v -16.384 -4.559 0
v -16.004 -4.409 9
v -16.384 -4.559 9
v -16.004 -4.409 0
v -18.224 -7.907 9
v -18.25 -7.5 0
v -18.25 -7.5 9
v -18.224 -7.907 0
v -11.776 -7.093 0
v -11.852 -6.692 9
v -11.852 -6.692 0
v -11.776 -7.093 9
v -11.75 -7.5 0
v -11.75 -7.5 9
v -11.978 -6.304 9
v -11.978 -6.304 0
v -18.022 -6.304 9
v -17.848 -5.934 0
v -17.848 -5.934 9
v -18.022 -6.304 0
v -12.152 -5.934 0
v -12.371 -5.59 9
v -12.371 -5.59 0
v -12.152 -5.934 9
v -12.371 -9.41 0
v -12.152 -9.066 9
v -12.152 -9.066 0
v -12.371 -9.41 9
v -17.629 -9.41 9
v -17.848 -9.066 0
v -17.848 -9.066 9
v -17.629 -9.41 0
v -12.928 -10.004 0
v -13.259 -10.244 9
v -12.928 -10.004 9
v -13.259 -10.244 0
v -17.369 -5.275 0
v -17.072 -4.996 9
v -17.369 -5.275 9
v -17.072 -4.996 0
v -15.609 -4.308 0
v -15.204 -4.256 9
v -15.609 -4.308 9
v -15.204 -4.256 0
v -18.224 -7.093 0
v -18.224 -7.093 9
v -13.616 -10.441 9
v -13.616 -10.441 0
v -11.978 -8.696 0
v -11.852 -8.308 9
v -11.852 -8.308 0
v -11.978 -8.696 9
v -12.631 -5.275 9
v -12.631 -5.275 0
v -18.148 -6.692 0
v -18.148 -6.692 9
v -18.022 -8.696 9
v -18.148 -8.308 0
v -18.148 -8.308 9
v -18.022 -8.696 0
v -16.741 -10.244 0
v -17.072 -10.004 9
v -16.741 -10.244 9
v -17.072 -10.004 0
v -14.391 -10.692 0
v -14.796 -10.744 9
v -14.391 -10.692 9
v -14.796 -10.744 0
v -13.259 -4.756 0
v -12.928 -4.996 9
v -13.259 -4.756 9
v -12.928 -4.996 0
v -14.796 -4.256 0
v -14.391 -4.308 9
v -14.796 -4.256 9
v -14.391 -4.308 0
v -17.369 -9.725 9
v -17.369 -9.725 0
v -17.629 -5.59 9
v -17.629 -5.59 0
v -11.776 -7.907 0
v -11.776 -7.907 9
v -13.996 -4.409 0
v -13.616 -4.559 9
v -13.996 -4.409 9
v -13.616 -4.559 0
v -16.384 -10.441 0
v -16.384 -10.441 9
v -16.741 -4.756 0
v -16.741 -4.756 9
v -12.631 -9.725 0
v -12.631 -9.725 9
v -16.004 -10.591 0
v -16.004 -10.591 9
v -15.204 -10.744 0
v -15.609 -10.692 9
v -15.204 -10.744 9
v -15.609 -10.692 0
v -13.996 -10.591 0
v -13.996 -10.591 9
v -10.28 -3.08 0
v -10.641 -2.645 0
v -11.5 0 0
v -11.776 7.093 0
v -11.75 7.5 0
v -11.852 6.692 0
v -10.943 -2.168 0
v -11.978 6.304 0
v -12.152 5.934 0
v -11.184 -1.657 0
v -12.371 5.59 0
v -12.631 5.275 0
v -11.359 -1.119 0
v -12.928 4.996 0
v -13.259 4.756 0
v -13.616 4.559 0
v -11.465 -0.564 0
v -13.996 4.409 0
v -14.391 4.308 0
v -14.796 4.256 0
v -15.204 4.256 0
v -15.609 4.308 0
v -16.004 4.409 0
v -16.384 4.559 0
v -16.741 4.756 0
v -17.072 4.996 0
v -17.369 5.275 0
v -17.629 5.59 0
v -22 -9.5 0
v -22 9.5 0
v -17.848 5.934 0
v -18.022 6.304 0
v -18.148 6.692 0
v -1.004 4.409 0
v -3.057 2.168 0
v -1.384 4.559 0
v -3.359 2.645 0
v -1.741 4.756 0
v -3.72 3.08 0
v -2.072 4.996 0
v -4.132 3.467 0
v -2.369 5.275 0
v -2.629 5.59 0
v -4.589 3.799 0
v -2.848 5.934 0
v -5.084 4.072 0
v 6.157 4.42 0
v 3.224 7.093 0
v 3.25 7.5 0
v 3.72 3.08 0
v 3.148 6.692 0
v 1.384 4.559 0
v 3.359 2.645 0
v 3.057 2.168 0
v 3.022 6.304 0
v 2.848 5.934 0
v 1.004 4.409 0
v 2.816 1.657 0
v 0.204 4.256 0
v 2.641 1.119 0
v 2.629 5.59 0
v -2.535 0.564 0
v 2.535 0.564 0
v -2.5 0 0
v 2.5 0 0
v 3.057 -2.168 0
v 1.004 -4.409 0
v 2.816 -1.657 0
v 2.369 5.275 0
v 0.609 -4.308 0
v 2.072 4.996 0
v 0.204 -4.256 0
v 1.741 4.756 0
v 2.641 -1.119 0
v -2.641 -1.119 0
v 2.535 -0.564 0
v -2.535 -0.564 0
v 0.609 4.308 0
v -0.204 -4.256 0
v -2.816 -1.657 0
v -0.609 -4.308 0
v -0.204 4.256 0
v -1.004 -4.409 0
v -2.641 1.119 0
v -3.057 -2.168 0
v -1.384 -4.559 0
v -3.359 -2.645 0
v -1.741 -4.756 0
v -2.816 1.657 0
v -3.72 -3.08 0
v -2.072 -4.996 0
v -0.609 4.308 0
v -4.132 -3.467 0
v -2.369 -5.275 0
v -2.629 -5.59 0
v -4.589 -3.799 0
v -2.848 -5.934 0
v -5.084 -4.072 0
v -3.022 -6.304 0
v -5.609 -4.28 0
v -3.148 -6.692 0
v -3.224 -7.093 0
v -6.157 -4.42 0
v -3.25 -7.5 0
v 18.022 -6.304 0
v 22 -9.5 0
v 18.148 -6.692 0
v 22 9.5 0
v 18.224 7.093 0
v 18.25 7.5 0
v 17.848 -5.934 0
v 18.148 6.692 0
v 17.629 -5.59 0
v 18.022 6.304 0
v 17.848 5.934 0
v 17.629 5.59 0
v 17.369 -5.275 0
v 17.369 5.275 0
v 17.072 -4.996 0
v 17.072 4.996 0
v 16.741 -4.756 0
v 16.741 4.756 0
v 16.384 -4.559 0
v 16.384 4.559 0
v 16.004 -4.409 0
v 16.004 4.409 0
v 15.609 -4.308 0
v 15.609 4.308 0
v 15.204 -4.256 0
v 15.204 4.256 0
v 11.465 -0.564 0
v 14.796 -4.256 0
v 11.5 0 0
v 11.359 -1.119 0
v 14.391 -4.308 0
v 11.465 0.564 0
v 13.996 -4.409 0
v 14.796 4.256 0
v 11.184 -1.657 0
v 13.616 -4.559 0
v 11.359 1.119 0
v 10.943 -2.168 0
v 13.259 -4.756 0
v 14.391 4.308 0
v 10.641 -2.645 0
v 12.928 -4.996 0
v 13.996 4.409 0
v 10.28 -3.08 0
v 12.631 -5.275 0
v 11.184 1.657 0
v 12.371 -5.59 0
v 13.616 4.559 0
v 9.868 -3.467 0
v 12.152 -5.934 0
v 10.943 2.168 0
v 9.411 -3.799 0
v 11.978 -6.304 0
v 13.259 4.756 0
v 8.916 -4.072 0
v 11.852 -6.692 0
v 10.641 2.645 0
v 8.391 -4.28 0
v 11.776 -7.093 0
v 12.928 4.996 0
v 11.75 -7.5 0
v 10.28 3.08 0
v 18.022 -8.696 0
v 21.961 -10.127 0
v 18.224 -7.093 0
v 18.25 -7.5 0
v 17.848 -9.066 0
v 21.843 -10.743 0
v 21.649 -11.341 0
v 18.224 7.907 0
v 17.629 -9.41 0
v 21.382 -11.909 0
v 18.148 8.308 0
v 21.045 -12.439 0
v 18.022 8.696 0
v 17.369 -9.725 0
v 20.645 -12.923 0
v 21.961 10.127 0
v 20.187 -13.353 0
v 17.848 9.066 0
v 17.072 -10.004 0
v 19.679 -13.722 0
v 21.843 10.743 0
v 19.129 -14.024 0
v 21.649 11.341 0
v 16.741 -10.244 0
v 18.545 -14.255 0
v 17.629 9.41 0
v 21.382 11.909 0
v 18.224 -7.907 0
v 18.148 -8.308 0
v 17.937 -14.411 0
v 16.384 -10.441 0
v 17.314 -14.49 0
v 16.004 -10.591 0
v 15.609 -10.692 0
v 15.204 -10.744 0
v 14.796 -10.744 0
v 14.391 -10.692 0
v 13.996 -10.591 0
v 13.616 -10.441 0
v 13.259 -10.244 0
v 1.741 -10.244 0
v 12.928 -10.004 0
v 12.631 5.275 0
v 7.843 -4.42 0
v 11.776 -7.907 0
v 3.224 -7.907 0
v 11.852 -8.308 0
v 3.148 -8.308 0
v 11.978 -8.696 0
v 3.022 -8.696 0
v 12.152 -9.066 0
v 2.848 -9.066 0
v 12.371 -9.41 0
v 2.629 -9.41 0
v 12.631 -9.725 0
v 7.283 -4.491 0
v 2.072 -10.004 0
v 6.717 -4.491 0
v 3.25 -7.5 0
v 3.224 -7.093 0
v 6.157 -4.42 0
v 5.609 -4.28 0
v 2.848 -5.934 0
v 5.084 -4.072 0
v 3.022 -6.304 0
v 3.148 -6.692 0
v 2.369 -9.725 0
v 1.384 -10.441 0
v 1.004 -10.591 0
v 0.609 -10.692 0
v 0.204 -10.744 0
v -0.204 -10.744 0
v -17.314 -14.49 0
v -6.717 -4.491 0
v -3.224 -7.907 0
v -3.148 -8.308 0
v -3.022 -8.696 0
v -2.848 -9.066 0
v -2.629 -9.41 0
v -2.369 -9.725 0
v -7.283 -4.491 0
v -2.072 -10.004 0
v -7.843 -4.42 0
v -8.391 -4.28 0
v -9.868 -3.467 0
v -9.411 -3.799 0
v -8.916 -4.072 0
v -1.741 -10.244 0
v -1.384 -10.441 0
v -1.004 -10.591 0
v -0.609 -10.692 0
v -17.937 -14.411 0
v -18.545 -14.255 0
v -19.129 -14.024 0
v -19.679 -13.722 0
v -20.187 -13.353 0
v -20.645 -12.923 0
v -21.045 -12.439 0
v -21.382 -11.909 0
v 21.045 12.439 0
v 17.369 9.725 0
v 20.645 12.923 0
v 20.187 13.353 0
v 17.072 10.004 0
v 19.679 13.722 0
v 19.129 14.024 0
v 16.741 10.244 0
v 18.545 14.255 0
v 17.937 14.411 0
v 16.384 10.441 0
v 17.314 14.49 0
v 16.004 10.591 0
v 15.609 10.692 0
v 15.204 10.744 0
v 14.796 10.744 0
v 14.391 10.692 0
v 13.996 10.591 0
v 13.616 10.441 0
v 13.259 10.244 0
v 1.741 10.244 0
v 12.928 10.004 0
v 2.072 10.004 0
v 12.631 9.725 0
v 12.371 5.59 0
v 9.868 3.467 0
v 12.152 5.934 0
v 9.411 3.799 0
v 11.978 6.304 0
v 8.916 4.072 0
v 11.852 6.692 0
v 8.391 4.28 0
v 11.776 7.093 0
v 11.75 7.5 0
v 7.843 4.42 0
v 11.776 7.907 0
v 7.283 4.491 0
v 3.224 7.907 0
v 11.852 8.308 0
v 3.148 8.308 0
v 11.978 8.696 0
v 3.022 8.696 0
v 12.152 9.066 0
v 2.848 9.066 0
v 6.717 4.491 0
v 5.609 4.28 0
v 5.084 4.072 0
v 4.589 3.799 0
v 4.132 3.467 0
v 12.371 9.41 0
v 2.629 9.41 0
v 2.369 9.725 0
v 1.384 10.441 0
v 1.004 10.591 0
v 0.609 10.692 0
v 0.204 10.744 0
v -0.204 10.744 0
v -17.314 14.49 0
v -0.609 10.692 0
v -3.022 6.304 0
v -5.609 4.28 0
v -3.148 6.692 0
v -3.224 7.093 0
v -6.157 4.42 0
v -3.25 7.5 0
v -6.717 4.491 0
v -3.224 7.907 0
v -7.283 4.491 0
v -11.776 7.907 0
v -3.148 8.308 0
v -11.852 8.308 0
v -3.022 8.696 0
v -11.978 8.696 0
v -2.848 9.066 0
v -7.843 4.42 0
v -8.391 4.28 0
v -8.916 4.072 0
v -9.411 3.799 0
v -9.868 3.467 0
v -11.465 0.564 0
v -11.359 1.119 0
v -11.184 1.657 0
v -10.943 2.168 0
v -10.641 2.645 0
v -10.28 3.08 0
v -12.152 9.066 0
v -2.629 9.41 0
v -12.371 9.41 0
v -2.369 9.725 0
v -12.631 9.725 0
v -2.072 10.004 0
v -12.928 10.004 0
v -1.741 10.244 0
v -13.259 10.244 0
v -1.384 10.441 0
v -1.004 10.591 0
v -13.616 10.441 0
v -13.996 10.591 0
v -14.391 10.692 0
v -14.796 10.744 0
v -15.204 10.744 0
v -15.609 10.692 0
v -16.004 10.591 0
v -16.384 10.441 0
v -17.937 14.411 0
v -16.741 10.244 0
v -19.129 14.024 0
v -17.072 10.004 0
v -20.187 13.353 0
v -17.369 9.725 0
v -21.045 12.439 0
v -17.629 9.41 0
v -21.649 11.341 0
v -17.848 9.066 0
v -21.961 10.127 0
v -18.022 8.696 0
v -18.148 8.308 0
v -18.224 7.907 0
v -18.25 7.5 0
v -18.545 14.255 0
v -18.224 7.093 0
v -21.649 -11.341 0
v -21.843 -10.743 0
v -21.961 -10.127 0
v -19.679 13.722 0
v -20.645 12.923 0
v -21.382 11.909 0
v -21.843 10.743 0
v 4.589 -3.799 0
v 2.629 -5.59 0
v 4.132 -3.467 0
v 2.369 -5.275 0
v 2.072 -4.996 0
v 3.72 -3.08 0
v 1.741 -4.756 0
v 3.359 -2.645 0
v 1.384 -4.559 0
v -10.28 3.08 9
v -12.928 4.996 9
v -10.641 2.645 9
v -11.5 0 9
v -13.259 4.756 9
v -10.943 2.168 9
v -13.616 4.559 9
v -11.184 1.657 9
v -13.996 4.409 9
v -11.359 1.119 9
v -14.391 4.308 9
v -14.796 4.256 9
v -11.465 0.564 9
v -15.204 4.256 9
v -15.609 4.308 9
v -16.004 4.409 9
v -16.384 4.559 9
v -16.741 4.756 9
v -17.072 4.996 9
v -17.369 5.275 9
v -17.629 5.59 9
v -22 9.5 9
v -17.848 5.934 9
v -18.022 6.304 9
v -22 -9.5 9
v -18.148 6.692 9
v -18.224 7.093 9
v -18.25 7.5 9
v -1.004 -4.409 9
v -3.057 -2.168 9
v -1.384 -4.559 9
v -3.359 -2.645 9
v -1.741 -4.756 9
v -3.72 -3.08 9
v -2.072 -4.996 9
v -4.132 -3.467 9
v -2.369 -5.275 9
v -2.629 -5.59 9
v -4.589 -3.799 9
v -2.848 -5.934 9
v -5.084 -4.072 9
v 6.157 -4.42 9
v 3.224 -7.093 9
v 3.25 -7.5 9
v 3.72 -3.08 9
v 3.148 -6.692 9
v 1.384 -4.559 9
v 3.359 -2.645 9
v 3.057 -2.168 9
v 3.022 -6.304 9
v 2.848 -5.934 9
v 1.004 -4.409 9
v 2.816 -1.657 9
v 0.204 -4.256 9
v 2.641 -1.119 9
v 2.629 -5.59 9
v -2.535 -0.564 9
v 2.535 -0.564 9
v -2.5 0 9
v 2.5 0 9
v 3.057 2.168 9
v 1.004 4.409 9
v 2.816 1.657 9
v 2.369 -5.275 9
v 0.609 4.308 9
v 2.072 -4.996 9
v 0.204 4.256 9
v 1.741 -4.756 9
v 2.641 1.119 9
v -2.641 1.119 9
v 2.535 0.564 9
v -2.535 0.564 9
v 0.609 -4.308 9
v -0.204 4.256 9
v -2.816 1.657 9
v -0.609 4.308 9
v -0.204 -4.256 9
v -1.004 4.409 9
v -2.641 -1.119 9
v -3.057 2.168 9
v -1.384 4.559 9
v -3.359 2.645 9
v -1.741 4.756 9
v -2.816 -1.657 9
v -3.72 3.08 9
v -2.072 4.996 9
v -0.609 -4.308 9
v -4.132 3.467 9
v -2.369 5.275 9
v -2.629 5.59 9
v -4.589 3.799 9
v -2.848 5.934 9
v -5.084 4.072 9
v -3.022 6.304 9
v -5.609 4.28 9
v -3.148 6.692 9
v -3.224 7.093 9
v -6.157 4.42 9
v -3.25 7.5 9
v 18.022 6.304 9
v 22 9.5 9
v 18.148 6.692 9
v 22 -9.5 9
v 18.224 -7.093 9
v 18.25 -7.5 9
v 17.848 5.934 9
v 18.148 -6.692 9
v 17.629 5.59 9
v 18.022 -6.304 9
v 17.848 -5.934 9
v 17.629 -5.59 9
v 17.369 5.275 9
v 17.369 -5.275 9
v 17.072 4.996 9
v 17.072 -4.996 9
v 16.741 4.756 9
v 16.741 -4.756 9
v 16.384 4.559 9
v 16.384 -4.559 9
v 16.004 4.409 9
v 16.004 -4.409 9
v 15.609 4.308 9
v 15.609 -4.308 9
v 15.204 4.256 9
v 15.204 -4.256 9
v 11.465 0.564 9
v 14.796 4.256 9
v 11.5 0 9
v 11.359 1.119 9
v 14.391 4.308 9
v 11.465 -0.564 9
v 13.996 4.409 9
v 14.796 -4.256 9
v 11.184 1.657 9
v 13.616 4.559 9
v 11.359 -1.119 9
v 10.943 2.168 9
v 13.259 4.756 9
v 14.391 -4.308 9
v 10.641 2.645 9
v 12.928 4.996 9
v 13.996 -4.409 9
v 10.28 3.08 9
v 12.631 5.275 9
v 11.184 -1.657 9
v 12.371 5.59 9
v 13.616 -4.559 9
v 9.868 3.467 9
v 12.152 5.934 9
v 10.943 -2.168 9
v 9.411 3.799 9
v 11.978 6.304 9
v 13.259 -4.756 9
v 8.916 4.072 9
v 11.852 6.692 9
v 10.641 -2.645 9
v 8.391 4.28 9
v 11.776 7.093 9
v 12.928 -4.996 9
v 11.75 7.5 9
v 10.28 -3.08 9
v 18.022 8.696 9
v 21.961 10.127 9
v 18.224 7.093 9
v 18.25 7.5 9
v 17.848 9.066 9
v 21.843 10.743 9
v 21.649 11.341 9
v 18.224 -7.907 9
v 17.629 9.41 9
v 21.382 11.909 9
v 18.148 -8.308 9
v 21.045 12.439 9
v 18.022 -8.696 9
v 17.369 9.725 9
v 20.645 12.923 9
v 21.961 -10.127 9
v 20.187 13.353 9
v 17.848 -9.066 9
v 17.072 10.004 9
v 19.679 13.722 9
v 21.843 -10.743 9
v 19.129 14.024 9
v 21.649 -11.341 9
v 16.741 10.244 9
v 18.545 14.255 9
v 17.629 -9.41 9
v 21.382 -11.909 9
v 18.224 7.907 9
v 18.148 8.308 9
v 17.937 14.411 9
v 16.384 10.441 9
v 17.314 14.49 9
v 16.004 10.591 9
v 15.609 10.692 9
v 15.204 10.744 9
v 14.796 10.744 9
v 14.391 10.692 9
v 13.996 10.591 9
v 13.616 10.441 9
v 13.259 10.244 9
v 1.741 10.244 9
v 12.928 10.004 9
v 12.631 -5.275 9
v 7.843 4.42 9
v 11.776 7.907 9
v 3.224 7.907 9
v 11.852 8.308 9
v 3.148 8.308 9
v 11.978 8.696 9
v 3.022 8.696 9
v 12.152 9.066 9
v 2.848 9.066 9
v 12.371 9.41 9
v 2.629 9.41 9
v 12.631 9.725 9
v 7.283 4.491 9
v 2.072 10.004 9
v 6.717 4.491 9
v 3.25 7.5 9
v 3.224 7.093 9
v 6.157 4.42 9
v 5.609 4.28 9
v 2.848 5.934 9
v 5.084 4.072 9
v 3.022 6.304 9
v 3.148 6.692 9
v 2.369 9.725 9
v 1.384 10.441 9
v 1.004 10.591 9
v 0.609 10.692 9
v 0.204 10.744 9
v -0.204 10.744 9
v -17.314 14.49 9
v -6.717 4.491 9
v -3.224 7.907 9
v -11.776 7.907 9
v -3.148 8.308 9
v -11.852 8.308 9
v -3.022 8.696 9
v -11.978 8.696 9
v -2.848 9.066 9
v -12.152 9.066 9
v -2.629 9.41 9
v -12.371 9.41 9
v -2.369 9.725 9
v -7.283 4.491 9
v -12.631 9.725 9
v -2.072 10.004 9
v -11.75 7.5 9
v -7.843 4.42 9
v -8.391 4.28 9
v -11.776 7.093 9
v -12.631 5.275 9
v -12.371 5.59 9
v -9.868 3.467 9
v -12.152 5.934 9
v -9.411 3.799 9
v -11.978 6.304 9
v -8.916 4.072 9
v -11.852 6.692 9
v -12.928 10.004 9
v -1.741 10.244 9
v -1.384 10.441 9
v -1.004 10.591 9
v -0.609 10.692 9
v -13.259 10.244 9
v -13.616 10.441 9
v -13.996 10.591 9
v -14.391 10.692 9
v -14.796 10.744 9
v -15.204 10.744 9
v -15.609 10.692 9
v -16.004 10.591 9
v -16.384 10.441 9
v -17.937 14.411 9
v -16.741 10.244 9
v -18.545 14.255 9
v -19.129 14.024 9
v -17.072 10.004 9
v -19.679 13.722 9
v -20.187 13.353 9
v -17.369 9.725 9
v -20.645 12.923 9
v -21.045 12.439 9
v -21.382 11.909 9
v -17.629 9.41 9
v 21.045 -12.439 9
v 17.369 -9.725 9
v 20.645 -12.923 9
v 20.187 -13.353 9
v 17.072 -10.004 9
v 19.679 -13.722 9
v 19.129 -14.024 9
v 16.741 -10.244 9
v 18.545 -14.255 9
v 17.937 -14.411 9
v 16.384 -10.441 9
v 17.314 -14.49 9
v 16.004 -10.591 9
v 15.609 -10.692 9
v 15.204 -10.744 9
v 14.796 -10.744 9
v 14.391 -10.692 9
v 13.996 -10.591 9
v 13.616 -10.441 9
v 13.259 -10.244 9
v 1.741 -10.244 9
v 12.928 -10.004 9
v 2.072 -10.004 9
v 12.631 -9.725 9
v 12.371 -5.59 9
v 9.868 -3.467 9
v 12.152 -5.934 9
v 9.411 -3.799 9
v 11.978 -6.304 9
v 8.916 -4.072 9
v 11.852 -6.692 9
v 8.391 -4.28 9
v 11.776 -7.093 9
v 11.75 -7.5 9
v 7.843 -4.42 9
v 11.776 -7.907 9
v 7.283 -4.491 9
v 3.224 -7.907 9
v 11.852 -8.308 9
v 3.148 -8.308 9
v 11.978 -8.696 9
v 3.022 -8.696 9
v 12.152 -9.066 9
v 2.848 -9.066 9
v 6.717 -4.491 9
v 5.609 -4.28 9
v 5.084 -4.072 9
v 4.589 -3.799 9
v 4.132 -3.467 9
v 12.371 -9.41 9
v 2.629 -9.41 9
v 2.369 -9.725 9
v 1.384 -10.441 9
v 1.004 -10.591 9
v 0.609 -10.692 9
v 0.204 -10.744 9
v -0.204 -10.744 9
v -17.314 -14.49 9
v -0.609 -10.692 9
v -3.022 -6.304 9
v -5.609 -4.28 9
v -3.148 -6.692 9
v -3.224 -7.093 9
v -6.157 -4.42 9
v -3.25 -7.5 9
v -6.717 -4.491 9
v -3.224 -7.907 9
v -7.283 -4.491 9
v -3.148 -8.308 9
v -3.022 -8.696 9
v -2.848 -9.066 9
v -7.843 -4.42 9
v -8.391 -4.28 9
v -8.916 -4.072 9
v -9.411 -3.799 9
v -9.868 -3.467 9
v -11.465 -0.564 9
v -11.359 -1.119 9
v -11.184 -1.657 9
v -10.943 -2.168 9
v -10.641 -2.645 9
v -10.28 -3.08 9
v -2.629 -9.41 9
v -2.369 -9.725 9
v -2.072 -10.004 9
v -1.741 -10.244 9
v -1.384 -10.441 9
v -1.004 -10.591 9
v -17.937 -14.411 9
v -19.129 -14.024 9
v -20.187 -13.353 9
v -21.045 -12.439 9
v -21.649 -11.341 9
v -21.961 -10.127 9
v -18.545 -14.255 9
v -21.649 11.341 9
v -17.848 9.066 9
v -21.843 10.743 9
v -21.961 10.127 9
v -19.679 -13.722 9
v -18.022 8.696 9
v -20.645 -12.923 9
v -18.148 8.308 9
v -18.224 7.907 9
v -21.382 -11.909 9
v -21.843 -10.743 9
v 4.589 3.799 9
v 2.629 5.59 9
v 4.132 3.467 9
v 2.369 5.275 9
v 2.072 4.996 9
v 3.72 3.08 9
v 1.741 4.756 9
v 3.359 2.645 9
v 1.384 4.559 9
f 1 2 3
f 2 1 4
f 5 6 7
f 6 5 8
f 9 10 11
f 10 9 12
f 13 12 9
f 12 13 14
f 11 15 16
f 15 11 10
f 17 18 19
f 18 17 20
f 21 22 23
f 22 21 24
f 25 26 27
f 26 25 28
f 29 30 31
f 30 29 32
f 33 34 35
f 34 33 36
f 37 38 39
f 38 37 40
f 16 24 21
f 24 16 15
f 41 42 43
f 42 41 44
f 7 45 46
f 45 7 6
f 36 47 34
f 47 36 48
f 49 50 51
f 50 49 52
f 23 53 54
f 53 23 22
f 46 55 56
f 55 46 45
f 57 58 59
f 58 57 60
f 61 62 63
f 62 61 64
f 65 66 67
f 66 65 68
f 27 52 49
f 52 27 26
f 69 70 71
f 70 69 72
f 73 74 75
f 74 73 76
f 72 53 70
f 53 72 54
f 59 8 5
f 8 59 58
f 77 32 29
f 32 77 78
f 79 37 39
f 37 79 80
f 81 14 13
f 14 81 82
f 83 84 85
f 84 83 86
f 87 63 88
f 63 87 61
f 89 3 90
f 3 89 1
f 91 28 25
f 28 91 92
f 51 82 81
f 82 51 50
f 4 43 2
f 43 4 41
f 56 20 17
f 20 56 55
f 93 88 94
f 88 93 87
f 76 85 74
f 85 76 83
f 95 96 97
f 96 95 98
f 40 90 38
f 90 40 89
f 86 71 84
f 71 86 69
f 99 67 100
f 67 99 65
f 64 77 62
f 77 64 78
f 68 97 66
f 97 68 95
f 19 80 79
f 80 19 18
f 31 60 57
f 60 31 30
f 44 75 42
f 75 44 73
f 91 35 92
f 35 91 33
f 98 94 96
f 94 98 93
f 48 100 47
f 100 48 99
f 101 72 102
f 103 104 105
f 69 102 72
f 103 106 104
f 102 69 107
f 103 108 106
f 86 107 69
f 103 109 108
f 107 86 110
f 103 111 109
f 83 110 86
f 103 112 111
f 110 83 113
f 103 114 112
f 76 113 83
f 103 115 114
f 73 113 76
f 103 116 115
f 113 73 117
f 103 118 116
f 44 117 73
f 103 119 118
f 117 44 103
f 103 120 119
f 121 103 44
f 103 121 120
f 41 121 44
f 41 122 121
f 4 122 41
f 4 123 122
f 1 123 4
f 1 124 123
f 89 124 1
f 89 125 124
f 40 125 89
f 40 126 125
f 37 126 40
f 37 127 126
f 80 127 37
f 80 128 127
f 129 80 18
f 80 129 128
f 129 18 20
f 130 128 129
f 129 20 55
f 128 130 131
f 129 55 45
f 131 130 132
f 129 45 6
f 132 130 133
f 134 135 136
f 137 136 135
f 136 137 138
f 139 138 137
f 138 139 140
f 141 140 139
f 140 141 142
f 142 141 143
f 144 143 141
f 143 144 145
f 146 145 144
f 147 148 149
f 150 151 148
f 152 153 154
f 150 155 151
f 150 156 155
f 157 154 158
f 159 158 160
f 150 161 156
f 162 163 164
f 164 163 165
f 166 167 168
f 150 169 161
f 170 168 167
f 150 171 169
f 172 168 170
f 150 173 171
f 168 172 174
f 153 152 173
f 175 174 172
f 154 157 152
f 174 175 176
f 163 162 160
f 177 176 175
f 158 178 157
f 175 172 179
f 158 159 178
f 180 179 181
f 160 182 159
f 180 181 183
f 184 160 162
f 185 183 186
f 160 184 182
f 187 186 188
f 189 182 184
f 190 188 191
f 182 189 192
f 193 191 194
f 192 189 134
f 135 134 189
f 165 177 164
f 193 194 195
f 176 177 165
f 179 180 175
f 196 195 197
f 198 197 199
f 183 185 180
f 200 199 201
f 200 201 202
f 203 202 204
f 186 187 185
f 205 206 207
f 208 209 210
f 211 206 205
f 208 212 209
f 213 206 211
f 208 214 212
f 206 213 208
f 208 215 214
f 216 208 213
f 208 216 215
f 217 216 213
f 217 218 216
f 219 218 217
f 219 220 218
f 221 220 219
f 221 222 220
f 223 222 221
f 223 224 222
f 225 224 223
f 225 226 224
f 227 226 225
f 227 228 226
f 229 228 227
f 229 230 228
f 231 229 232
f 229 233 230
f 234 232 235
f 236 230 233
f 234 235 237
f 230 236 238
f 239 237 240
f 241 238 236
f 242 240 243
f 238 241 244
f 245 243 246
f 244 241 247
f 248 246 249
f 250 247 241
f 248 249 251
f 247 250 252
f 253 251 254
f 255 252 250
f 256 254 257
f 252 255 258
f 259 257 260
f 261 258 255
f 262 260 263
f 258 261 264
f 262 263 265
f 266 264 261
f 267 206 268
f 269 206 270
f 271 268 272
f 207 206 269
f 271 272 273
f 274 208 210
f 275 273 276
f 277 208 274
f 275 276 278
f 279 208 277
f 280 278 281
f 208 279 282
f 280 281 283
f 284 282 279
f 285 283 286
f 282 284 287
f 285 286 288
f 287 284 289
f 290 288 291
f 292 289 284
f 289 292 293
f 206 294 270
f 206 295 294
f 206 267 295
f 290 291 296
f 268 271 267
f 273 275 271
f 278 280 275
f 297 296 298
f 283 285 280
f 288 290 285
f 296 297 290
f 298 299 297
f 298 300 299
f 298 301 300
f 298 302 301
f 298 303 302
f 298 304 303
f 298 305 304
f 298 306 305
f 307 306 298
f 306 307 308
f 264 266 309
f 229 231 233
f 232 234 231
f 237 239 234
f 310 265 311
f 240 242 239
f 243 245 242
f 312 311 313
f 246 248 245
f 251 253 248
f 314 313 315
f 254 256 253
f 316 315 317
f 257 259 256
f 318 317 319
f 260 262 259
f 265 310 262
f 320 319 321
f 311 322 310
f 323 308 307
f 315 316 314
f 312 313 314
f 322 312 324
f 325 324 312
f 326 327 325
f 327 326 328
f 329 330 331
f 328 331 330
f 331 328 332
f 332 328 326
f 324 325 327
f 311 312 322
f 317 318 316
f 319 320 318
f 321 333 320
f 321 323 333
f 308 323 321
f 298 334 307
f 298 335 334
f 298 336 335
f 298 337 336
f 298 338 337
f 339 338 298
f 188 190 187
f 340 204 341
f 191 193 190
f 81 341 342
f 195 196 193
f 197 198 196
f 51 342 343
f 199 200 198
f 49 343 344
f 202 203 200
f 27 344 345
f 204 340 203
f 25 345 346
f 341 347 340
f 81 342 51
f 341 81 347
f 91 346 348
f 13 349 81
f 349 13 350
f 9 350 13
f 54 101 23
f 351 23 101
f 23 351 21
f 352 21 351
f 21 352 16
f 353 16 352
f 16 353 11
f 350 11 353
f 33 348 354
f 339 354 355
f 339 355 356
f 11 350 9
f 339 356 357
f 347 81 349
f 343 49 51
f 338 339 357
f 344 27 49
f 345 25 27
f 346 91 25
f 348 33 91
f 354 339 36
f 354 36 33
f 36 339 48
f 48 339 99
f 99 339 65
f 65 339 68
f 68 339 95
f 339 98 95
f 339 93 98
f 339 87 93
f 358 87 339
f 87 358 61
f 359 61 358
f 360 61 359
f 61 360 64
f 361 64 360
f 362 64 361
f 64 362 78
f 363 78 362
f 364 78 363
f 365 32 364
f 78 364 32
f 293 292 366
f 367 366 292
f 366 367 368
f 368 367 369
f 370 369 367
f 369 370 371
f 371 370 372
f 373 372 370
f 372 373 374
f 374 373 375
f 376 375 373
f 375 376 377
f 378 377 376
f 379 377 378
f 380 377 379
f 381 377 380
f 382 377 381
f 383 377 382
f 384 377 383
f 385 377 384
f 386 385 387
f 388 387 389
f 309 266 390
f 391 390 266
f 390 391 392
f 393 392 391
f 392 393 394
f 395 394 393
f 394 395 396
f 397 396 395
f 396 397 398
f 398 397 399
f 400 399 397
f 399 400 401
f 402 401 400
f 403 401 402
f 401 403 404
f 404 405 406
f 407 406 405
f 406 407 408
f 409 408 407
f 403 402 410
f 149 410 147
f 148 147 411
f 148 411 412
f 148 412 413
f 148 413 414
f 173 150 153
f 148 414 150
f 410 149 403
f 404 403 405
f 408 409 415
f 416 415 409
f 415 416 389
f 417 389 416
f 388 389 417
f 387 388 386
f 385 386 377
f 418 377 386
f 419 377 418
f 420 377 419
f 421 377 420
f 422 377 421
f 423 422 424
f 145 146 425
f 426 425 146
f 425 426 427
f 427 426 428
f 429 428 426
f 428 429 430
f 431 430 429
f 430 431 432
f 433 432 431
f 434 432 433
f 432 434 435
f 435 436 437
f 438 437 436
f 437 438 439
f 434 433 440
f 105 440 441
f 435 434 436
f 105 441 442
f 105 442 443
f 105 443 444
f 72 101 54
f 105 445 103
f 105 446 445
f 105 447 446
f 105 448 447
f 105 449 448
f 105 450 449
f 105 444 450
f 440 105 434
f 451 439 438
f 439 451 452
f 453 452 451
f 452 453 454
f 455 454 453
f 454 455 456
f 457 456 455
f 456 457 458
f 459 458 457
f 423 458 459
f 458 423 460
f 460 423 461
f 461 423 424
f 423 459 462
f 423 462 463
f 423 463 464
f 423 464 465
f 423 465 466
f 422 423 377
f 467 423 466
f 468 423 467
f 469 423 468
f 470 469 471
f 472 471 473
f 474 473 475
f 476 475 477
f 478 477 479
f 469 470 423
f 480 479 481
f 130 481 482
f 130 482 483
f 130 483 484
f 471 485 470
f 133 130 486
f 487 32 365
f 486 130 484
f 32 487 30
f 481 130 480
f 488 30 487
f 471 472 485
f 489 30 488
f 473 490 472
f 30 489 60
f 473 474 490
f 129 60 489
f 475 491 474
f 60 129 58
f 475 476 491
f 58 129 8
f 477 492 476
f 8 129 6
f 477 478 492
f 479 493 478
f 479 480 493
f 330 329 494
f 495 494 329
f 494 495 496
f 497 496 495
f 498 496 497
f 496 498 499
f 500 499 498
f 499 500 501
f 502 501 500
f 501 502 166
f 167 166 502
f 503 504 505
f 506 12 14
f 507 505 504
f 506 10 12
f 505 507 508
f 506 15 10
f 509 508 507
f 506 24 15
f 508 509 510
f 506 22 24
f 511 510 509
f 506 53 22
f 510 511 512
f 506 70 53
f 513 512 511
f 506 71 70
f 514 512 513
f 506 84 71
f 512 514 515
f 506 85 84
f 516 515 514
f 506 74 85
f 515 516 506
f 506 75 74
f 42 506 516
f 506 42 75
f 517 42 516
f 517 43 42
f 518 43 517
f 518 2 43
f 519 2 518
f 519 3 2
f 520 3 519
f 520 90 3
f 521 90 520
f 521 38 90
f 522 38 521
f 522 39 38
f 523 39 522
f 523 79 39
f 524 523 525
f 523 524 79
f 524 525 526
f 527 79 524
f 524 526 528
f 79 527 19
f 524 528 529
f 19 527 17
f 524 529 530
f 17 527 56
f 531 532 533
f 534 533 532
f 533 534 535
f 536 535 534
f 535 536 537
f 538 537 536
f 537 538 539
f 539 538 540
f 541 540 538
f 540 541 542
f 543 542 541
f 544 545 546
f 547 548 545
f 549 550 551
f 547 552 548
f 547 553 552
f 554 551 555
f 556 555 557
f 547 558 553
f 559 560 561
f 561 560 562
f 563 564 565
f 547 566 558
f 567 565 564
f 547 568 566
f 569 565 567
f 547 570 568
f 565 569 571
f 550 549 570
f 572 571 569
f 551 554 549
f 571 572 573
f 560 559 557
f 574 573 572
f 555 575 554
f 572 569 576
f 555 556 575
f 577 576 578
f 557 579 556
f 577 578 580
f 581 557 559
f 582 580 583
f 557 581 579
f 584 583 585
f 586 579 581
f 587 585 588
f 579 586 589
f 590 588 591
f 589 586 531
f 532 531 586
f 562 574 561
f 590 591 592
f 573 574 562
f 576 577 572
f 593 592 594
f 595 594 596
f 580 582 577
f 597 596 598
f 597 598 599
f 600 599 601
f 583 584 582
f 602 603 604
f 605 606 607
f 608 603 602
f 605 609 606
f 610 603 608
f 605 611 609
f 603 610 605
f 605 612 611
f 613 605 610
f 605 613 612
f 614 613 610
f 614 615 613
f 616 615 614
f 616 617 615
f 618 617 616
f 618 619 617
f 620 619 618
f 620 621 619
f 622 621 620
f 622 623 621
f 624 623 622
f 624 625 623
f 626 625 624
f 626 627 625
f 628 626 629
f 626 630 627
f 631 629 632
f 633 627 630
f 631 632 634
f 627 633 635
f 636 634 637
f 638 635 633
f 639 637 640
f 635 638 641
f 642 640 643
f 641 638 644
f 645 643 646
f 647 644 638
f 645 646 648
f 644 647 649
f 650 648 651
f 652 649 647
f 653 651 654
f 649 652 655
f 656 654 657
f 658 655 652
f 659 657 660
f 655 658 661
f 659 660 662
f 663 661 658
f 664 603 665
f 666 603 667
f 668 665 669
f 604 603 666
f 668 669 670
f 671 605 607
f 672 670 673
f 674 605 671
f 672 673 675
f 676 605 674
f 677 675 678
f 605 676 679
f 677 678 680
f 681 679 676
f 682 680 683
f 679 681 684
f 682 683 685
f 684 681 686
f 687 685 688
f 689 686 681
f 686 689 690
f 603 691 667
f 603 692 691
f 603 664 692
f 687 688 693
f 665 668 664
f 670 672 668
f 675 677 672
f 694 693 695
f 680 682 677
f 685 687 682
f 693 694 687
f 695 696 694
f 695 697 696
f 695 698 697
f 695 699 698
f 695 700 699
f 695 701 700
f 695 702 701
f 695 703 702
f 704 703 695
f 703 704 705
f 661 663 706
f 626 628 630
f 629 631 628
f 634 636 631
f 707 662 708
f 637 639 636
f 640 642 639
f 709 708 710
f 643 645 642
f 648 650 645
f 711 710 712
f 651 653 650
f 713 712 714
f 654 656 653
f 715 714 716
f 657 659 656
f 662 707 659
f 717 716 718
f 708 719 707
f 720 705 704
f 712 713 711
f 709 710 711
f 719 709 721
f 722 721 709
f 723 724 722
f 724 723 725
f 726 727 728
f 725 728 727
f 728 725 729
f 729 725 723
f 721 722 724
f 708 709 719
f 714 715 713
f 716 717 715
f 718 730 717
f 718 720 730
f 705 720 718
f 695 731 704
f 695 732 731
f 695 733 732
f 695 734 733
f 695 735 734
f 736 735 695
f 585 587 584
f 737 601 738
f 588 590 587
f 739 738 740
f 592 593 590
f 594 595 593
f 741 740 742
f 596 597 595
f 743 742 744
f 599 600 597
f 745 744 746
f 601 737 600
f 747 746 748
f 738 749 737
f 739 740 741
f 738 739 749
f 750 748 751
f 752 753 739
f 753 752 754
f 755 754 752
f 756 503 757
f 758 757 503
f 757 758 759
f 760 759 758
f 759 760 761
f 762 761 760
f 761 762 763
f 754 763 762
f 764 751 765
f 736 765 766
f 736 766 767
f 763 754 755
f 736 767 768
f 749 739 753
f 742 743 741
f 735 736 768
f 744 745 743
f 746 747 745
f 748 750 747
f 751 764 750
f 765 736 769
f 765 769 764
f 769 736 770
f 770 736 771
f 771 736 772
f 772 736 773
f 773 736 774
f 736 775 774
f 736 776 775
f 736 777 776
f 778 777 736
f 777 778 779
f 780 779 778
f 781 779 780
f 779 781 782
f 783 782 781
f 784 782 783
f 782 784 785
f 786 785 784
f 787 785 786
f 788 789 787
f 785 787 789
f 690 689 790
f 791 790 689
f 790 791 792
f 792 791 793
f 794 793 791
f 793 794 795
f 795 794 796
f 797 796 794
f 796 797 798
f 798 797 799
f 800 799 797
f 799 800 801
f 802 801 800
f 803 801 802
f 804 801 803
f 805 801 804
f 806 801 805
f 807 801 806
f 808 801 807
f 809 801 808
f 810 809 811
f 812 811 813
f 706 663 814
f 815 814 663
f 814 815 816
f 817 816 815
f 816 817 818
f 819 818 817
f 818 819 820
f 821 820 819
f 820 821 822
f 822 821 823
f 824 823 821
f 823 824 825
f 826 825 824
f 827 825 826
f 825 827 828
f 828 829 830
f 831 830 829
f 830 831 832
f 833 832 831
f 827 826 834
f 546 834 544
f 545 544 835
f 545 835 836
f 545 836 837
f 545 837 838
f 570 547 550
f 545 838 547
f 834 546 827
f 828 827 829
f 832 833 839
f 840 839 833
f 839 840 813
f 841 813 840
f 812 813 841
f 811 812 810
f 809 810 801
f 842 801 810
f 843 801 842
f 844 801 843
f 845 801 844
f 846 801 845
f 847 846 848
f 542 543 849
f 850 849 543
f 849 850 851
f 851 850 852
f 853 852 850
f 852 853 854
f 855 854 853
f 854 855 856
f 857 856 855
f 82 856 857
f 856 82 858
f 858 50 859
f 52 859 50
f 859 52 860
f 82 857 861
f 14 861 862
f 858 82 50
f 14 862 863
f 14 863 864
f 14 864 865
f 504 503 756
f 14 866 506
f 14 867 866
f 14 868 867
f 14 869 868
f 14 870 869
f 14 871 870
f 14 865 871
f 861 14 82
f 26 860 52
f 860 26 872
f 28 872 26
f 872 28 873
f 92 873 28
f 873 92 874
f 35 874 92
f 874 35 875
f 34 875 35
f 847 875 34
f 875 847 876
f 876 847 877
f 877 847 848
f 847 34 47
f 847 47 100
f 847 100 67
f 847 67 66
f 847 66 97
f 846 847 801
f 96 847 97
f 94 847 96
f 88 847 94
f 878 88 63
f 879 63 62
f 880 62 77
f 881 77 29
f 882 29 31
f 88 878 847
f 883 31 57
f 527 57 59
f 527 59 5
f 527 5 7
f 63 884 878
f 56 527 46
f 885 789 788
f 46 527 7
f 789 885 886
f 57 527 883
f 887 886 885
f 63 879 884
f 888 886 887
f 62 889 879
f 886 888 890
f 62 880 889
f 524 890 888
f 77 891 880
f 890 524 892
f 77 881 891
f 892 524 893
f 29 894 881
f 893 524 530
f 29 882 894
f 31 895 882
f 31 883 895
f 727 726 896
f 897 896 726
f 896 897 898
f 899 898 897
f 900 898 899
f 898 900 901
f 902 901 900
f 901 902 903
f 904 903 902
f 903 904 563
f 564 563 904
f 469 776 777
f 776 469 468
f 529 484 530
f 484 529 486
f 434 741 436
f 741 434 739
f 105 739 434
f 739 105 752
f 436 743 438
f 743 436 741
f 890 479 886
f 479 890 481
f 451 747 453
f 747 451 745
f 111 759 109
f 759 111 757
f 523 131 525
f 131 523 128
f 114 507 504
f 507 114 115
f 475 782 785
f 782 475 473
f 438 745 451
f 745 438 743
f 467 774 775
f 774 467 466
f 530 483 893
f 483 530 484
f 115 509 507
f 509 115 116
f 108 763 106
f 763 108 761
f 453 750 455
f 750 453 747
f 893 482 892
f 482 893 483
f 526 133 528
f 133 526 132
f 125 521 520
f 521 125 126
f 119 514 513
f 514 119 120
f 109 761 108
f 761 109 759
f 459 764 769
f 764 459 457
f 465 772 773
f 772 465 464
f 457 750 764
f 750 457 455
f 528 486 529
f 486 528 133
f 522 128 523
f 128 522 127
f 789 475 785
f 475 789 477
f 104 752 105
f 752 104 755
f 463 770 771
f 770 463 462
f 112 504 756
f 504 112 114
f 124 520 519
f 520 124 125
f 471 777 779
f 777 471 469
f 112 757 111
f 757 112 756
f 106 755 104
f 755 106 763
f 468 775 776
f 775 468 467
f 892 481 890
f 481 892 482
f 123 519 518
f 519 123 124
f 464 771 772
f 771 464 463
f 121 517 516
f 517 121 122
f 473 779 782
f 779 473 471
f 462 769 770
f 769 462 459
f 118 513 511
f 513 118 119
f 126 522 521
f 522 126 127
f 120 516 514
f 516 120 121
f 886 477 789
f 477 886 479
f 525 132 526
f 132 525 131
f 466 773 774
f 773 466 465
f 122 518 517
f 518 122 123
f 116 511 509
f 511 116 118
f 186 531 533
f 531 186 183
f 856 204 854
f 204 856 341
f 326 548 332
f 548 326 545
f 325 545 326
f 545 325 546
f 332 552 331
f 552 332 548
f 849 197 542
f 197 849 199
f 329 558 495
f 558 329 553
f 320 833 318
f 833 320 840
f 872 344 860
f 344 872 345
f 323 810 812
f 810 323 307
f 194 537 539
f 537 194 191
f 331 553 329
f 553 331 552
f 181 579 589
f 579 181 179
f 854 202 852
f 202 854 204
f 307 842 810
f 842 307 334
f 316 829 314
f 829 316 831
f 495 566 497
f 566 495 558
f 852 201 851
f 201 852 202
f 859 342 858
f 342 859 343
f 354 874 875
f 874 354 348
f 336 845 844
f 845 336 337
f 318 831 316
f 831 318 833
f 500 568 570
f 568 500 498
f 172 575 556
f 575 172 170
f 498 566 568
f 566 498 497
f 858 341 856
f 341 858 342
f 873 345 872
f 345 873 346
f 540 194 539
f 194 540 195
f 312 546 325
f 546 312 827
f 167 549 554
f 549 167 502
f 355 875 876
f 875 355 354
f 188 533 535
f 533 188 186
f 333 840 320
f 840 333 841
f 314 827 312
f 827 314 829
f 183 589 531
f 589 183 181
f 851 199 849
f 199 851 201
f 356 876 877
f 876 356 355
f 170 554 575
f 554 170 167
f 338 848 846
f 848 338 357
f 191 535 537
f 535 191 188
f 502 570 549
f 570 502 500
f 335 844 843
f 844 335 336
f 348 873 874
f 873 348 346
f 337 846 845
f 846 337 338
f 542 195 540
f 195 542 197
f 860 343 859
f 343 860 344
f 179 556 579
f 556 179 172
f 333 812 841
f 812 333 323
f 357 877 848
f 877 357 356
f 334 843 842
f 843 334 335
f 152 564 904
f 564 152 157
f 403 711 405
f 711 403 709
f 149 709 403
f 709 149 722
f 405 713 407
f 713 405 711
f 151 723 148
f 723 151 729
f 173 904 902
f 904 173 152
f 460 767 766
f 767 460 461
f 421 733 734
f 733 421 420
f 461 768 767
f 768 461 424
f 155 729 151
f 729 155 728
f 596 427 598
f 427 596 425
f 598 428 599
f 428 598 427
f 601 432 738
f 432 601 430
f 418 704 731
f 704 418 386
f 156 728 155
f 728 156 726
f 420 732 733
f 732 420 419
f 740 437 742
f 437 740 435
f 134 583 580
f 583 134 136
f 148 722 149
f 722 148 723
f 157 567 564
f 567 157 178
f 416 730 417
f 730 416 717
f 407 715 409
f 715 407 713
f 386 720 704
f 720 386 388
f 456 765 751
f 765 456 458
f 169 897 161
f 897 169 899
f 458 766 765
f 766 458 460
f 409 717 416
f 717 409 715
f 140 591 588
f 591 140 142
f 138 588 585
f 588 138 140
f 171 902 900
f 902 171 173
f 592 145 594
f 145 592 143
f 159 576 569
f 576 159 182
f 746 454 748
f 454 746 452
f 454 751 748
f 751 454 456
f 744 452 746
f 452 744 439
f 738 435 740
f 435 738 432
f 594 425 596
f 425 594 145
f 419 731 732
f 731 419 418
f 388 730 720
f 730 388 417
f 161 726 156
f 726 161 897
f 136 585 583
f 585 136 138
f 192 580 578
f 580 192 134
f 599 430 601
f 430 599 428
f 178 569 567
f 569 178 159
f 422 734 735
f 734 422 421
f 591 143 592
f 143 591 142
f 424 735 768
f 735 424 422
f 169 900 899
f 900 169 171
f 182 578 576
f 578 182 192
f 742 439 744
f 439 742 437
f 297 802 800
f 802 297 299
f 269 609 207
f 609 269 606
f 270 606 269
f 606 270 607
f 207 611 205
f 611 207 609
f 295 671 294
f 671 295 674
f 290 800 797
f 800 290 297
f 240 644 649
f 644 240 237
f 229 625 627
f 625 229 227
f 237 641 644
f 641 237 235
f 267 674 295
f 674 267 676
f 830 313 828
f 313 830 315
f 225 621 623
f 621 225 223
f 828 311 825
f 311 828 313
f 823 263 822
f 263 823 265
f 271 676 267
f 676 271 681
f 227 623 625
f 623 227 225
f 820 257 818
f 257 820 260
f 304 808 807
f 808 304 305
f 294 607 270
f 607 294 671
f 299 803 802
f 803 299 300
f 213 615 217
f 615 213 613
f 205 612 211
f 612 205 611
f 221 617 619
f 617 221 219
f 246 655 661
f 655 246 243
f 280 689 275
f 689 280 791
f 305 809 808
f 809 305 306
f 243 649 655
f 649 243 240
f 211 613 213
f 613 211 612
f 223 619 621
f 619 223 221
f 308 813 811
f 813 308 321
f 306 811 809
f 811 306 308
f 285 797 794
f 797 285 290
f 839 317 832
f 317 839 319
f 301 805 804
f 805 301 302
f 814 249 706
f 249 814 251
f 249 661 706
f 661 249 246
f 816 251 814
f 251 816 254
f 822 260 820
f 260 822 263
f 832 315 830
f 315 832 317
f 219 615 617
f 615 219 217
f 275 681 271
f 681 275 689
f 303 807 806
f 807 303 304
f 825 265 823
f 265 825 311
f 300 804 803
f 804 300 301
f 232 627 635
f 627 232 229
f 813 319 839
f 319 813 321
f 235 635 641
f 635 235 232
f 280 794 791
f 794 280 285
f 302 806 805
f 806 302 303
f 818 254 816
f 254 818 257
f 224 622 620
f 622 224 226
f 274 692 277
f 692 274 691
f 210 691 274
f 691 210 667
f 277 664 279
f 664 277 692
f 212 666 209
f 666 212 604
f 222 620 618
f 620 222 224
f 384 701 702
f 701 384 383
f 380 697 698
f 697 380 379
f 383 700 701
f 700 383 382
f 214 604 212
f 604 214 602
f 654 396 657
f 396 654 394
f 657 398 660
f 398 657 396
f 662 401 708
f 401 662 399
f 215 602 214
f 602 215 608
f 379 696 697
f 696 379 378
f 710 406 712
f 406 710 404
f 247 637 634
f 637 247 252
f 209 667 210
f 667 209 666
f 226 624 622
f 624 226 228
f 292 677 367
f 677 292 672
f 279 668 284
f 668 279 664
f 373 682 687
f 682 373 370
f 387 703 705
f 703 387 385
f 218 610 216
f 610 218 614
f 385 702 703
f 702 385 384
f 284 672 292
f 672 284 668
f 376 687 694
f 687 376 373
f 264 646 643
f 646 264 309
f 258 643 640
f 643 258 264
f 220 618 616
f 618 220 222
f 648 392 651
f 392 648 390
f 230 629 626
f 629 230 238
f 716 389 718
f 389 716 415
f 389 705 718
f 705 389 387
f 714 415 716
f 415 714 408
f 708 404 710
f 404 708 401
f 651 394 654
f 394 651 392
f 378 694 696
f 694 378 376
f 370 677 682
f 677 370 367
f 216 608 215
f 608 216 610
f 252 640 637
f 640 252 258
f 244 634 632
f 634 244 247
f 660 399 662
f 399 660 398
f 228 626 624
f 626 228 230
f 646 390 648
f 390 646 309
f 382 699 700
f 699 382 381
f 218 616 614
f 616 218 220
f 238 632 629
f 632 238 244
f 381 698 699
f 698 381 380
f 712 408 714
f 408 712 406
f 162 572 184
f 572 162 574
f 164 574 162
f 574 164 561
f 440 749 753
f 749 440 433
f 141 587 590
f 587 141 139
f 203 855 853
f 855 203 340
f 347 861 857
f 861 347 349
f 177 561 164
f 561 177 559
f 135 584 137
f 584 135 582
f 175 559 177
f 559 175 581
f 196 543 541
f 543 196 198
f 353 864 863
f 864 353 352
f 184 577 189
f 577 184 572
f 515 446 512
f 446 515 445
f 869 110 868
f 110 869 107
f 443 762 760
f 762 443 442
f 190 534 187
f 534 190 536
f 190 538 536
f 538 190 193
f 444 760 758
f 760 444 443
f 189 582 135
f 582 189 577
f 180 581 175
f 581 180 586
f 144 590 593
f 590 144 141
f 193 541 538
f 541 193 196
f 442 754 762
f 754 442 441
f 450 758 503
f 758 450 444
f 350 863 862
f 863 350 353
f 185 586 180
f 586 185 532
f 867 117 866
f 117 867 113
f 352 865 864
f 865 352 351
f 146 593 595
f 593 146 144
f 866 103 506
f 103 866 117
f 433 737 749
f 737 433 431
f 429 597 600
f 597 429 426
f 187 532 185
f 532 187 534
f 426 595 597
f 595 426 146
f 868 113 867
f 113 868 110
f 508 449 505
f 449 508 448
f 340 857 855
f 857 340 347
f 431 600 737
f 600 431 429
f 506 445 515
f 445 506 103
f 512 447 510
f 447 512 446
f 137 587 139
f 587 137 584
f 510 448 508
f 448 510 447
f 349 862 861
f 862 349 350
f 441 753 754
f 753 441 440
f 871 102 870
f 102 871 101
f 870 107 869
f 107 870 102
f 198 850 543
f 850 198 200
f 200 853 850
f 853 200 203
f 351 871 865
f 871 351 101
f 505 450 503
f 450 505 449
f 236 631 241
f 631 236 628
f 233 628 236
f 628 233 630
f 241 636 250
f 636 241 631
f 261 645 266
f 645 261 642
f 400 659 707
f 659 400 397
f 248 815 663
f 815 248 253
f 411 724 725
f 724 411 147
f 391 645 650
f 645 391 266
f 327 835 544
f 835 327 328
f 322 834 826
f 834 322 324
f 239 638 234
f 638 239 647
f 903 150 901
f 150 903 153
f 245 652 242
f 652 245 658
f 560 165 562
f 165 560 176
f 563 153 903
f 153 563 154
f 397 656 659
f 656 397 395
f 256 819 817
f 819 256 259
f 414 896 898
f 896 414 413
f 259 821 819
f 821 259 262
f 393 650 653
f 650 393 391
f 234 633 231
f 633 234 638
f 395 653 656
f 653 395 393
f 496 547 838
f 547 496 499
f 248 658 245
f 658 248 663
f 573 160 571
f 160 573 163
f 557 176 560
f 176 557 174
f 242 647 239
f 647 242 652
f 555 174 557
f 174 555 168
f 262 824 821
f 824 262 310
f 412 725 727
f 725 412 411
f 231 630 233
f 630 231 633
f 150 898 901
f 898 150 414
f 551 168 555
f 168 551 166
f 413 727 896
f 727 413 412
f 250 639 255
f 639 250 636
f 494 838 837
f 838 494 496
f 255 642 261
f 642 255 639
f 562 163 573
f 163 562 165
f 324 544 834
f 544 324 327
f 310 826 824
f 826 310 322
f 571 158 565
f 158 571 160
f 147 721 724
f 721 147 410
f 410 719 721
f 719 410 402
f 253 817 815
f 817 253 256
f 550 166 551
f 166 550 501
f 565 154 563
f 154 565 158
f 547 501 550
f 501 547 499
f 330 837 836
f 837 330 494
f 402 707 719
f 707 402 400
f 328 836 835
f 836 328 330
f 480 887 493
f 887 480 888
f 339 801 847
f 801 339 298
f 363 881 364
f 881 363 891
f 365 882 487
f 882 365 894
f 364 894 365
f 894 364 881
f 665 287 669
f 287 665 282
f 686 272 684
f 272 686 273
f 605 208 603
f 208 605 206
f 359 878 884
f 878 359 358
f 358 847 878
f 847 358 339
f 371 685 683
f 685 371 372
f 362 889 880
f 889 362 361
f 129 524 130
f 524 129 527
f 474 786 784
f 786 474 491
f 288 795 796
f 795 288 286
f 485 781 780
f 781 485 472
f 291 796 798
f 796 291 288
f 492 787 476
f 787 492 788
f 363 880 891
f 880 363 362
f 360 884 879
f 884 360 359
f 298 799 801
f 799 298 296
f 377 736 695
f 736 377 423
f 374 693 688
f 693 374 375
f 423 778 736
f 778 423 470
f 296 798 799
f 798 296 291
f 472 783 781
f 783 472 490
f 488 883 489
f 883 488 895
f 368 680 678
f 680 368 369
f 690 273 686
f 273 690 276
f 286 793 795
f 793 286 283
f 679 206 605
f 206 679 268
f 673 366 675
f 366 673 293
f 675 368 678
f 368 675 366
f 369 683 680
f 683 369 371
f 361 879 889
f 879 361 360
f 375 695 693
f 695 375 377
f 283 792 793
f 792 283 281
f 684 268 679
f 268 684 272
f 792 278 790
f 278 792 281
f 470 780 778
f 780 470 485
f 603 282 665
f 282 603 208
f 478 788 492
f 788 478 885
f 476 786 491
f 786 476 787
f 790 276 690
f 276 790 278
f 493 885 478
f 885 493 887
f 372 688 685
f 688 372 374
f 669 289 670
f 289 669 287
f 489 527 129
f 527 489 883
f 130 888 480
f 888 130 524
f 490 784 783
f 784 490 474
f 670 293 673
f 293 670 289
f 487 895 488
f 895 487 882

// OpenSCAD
$fn = 50;

difference() {
	union() {
		hull() {
			translate(v = [-17.0, 9.5, 0]) {
				cylinder(h = 9, r = 5);
			}
			translate(v = [17.0, 9.5, 0]) {
				cylinder(h = 9, r = 5);
			}
			translate(v = [-17.0, -9.5, 0]) {
				cylinder(h = 9, r = 5);
			}
			translate(v = [17.0, -9.5, 0]) {
				cylinder(h = 9, r = 5);
			}
		}
	}
	union() {
		translate(v = [-15.0, -7.5, 0]) {
			cylinder(h = 9, r = 3.25);
		}
		translate(v = [-15.0, 7.5, 0]) {
			cylinder(h = 9, r = 3.25);
		}
		translate(v = [0.0, -7.5, 0]) {
			cylinder(h = 9, r = 3.25);
		}
		translate(v = [0.0, 7.5, 0]) {
			cylinder(h = 9, r = 3.25);
		}
		translate(v = [15.0, -7.5, 0]) {
			cylinder(h = 9, r = 3.25);
		}
		translate(v = [15.0, 7.5, 0]) {
			cylinder(h = 9, r = 3.25);
		}
		translate(v = [-7.0, 0, 0.0]) {
			cylinder(h = 9, r = 4.5);
		}
		translate(v = [7.0, 0, 0.0]) {
			cylinder(h = 9, r = 4.5);
		}
	}
}
